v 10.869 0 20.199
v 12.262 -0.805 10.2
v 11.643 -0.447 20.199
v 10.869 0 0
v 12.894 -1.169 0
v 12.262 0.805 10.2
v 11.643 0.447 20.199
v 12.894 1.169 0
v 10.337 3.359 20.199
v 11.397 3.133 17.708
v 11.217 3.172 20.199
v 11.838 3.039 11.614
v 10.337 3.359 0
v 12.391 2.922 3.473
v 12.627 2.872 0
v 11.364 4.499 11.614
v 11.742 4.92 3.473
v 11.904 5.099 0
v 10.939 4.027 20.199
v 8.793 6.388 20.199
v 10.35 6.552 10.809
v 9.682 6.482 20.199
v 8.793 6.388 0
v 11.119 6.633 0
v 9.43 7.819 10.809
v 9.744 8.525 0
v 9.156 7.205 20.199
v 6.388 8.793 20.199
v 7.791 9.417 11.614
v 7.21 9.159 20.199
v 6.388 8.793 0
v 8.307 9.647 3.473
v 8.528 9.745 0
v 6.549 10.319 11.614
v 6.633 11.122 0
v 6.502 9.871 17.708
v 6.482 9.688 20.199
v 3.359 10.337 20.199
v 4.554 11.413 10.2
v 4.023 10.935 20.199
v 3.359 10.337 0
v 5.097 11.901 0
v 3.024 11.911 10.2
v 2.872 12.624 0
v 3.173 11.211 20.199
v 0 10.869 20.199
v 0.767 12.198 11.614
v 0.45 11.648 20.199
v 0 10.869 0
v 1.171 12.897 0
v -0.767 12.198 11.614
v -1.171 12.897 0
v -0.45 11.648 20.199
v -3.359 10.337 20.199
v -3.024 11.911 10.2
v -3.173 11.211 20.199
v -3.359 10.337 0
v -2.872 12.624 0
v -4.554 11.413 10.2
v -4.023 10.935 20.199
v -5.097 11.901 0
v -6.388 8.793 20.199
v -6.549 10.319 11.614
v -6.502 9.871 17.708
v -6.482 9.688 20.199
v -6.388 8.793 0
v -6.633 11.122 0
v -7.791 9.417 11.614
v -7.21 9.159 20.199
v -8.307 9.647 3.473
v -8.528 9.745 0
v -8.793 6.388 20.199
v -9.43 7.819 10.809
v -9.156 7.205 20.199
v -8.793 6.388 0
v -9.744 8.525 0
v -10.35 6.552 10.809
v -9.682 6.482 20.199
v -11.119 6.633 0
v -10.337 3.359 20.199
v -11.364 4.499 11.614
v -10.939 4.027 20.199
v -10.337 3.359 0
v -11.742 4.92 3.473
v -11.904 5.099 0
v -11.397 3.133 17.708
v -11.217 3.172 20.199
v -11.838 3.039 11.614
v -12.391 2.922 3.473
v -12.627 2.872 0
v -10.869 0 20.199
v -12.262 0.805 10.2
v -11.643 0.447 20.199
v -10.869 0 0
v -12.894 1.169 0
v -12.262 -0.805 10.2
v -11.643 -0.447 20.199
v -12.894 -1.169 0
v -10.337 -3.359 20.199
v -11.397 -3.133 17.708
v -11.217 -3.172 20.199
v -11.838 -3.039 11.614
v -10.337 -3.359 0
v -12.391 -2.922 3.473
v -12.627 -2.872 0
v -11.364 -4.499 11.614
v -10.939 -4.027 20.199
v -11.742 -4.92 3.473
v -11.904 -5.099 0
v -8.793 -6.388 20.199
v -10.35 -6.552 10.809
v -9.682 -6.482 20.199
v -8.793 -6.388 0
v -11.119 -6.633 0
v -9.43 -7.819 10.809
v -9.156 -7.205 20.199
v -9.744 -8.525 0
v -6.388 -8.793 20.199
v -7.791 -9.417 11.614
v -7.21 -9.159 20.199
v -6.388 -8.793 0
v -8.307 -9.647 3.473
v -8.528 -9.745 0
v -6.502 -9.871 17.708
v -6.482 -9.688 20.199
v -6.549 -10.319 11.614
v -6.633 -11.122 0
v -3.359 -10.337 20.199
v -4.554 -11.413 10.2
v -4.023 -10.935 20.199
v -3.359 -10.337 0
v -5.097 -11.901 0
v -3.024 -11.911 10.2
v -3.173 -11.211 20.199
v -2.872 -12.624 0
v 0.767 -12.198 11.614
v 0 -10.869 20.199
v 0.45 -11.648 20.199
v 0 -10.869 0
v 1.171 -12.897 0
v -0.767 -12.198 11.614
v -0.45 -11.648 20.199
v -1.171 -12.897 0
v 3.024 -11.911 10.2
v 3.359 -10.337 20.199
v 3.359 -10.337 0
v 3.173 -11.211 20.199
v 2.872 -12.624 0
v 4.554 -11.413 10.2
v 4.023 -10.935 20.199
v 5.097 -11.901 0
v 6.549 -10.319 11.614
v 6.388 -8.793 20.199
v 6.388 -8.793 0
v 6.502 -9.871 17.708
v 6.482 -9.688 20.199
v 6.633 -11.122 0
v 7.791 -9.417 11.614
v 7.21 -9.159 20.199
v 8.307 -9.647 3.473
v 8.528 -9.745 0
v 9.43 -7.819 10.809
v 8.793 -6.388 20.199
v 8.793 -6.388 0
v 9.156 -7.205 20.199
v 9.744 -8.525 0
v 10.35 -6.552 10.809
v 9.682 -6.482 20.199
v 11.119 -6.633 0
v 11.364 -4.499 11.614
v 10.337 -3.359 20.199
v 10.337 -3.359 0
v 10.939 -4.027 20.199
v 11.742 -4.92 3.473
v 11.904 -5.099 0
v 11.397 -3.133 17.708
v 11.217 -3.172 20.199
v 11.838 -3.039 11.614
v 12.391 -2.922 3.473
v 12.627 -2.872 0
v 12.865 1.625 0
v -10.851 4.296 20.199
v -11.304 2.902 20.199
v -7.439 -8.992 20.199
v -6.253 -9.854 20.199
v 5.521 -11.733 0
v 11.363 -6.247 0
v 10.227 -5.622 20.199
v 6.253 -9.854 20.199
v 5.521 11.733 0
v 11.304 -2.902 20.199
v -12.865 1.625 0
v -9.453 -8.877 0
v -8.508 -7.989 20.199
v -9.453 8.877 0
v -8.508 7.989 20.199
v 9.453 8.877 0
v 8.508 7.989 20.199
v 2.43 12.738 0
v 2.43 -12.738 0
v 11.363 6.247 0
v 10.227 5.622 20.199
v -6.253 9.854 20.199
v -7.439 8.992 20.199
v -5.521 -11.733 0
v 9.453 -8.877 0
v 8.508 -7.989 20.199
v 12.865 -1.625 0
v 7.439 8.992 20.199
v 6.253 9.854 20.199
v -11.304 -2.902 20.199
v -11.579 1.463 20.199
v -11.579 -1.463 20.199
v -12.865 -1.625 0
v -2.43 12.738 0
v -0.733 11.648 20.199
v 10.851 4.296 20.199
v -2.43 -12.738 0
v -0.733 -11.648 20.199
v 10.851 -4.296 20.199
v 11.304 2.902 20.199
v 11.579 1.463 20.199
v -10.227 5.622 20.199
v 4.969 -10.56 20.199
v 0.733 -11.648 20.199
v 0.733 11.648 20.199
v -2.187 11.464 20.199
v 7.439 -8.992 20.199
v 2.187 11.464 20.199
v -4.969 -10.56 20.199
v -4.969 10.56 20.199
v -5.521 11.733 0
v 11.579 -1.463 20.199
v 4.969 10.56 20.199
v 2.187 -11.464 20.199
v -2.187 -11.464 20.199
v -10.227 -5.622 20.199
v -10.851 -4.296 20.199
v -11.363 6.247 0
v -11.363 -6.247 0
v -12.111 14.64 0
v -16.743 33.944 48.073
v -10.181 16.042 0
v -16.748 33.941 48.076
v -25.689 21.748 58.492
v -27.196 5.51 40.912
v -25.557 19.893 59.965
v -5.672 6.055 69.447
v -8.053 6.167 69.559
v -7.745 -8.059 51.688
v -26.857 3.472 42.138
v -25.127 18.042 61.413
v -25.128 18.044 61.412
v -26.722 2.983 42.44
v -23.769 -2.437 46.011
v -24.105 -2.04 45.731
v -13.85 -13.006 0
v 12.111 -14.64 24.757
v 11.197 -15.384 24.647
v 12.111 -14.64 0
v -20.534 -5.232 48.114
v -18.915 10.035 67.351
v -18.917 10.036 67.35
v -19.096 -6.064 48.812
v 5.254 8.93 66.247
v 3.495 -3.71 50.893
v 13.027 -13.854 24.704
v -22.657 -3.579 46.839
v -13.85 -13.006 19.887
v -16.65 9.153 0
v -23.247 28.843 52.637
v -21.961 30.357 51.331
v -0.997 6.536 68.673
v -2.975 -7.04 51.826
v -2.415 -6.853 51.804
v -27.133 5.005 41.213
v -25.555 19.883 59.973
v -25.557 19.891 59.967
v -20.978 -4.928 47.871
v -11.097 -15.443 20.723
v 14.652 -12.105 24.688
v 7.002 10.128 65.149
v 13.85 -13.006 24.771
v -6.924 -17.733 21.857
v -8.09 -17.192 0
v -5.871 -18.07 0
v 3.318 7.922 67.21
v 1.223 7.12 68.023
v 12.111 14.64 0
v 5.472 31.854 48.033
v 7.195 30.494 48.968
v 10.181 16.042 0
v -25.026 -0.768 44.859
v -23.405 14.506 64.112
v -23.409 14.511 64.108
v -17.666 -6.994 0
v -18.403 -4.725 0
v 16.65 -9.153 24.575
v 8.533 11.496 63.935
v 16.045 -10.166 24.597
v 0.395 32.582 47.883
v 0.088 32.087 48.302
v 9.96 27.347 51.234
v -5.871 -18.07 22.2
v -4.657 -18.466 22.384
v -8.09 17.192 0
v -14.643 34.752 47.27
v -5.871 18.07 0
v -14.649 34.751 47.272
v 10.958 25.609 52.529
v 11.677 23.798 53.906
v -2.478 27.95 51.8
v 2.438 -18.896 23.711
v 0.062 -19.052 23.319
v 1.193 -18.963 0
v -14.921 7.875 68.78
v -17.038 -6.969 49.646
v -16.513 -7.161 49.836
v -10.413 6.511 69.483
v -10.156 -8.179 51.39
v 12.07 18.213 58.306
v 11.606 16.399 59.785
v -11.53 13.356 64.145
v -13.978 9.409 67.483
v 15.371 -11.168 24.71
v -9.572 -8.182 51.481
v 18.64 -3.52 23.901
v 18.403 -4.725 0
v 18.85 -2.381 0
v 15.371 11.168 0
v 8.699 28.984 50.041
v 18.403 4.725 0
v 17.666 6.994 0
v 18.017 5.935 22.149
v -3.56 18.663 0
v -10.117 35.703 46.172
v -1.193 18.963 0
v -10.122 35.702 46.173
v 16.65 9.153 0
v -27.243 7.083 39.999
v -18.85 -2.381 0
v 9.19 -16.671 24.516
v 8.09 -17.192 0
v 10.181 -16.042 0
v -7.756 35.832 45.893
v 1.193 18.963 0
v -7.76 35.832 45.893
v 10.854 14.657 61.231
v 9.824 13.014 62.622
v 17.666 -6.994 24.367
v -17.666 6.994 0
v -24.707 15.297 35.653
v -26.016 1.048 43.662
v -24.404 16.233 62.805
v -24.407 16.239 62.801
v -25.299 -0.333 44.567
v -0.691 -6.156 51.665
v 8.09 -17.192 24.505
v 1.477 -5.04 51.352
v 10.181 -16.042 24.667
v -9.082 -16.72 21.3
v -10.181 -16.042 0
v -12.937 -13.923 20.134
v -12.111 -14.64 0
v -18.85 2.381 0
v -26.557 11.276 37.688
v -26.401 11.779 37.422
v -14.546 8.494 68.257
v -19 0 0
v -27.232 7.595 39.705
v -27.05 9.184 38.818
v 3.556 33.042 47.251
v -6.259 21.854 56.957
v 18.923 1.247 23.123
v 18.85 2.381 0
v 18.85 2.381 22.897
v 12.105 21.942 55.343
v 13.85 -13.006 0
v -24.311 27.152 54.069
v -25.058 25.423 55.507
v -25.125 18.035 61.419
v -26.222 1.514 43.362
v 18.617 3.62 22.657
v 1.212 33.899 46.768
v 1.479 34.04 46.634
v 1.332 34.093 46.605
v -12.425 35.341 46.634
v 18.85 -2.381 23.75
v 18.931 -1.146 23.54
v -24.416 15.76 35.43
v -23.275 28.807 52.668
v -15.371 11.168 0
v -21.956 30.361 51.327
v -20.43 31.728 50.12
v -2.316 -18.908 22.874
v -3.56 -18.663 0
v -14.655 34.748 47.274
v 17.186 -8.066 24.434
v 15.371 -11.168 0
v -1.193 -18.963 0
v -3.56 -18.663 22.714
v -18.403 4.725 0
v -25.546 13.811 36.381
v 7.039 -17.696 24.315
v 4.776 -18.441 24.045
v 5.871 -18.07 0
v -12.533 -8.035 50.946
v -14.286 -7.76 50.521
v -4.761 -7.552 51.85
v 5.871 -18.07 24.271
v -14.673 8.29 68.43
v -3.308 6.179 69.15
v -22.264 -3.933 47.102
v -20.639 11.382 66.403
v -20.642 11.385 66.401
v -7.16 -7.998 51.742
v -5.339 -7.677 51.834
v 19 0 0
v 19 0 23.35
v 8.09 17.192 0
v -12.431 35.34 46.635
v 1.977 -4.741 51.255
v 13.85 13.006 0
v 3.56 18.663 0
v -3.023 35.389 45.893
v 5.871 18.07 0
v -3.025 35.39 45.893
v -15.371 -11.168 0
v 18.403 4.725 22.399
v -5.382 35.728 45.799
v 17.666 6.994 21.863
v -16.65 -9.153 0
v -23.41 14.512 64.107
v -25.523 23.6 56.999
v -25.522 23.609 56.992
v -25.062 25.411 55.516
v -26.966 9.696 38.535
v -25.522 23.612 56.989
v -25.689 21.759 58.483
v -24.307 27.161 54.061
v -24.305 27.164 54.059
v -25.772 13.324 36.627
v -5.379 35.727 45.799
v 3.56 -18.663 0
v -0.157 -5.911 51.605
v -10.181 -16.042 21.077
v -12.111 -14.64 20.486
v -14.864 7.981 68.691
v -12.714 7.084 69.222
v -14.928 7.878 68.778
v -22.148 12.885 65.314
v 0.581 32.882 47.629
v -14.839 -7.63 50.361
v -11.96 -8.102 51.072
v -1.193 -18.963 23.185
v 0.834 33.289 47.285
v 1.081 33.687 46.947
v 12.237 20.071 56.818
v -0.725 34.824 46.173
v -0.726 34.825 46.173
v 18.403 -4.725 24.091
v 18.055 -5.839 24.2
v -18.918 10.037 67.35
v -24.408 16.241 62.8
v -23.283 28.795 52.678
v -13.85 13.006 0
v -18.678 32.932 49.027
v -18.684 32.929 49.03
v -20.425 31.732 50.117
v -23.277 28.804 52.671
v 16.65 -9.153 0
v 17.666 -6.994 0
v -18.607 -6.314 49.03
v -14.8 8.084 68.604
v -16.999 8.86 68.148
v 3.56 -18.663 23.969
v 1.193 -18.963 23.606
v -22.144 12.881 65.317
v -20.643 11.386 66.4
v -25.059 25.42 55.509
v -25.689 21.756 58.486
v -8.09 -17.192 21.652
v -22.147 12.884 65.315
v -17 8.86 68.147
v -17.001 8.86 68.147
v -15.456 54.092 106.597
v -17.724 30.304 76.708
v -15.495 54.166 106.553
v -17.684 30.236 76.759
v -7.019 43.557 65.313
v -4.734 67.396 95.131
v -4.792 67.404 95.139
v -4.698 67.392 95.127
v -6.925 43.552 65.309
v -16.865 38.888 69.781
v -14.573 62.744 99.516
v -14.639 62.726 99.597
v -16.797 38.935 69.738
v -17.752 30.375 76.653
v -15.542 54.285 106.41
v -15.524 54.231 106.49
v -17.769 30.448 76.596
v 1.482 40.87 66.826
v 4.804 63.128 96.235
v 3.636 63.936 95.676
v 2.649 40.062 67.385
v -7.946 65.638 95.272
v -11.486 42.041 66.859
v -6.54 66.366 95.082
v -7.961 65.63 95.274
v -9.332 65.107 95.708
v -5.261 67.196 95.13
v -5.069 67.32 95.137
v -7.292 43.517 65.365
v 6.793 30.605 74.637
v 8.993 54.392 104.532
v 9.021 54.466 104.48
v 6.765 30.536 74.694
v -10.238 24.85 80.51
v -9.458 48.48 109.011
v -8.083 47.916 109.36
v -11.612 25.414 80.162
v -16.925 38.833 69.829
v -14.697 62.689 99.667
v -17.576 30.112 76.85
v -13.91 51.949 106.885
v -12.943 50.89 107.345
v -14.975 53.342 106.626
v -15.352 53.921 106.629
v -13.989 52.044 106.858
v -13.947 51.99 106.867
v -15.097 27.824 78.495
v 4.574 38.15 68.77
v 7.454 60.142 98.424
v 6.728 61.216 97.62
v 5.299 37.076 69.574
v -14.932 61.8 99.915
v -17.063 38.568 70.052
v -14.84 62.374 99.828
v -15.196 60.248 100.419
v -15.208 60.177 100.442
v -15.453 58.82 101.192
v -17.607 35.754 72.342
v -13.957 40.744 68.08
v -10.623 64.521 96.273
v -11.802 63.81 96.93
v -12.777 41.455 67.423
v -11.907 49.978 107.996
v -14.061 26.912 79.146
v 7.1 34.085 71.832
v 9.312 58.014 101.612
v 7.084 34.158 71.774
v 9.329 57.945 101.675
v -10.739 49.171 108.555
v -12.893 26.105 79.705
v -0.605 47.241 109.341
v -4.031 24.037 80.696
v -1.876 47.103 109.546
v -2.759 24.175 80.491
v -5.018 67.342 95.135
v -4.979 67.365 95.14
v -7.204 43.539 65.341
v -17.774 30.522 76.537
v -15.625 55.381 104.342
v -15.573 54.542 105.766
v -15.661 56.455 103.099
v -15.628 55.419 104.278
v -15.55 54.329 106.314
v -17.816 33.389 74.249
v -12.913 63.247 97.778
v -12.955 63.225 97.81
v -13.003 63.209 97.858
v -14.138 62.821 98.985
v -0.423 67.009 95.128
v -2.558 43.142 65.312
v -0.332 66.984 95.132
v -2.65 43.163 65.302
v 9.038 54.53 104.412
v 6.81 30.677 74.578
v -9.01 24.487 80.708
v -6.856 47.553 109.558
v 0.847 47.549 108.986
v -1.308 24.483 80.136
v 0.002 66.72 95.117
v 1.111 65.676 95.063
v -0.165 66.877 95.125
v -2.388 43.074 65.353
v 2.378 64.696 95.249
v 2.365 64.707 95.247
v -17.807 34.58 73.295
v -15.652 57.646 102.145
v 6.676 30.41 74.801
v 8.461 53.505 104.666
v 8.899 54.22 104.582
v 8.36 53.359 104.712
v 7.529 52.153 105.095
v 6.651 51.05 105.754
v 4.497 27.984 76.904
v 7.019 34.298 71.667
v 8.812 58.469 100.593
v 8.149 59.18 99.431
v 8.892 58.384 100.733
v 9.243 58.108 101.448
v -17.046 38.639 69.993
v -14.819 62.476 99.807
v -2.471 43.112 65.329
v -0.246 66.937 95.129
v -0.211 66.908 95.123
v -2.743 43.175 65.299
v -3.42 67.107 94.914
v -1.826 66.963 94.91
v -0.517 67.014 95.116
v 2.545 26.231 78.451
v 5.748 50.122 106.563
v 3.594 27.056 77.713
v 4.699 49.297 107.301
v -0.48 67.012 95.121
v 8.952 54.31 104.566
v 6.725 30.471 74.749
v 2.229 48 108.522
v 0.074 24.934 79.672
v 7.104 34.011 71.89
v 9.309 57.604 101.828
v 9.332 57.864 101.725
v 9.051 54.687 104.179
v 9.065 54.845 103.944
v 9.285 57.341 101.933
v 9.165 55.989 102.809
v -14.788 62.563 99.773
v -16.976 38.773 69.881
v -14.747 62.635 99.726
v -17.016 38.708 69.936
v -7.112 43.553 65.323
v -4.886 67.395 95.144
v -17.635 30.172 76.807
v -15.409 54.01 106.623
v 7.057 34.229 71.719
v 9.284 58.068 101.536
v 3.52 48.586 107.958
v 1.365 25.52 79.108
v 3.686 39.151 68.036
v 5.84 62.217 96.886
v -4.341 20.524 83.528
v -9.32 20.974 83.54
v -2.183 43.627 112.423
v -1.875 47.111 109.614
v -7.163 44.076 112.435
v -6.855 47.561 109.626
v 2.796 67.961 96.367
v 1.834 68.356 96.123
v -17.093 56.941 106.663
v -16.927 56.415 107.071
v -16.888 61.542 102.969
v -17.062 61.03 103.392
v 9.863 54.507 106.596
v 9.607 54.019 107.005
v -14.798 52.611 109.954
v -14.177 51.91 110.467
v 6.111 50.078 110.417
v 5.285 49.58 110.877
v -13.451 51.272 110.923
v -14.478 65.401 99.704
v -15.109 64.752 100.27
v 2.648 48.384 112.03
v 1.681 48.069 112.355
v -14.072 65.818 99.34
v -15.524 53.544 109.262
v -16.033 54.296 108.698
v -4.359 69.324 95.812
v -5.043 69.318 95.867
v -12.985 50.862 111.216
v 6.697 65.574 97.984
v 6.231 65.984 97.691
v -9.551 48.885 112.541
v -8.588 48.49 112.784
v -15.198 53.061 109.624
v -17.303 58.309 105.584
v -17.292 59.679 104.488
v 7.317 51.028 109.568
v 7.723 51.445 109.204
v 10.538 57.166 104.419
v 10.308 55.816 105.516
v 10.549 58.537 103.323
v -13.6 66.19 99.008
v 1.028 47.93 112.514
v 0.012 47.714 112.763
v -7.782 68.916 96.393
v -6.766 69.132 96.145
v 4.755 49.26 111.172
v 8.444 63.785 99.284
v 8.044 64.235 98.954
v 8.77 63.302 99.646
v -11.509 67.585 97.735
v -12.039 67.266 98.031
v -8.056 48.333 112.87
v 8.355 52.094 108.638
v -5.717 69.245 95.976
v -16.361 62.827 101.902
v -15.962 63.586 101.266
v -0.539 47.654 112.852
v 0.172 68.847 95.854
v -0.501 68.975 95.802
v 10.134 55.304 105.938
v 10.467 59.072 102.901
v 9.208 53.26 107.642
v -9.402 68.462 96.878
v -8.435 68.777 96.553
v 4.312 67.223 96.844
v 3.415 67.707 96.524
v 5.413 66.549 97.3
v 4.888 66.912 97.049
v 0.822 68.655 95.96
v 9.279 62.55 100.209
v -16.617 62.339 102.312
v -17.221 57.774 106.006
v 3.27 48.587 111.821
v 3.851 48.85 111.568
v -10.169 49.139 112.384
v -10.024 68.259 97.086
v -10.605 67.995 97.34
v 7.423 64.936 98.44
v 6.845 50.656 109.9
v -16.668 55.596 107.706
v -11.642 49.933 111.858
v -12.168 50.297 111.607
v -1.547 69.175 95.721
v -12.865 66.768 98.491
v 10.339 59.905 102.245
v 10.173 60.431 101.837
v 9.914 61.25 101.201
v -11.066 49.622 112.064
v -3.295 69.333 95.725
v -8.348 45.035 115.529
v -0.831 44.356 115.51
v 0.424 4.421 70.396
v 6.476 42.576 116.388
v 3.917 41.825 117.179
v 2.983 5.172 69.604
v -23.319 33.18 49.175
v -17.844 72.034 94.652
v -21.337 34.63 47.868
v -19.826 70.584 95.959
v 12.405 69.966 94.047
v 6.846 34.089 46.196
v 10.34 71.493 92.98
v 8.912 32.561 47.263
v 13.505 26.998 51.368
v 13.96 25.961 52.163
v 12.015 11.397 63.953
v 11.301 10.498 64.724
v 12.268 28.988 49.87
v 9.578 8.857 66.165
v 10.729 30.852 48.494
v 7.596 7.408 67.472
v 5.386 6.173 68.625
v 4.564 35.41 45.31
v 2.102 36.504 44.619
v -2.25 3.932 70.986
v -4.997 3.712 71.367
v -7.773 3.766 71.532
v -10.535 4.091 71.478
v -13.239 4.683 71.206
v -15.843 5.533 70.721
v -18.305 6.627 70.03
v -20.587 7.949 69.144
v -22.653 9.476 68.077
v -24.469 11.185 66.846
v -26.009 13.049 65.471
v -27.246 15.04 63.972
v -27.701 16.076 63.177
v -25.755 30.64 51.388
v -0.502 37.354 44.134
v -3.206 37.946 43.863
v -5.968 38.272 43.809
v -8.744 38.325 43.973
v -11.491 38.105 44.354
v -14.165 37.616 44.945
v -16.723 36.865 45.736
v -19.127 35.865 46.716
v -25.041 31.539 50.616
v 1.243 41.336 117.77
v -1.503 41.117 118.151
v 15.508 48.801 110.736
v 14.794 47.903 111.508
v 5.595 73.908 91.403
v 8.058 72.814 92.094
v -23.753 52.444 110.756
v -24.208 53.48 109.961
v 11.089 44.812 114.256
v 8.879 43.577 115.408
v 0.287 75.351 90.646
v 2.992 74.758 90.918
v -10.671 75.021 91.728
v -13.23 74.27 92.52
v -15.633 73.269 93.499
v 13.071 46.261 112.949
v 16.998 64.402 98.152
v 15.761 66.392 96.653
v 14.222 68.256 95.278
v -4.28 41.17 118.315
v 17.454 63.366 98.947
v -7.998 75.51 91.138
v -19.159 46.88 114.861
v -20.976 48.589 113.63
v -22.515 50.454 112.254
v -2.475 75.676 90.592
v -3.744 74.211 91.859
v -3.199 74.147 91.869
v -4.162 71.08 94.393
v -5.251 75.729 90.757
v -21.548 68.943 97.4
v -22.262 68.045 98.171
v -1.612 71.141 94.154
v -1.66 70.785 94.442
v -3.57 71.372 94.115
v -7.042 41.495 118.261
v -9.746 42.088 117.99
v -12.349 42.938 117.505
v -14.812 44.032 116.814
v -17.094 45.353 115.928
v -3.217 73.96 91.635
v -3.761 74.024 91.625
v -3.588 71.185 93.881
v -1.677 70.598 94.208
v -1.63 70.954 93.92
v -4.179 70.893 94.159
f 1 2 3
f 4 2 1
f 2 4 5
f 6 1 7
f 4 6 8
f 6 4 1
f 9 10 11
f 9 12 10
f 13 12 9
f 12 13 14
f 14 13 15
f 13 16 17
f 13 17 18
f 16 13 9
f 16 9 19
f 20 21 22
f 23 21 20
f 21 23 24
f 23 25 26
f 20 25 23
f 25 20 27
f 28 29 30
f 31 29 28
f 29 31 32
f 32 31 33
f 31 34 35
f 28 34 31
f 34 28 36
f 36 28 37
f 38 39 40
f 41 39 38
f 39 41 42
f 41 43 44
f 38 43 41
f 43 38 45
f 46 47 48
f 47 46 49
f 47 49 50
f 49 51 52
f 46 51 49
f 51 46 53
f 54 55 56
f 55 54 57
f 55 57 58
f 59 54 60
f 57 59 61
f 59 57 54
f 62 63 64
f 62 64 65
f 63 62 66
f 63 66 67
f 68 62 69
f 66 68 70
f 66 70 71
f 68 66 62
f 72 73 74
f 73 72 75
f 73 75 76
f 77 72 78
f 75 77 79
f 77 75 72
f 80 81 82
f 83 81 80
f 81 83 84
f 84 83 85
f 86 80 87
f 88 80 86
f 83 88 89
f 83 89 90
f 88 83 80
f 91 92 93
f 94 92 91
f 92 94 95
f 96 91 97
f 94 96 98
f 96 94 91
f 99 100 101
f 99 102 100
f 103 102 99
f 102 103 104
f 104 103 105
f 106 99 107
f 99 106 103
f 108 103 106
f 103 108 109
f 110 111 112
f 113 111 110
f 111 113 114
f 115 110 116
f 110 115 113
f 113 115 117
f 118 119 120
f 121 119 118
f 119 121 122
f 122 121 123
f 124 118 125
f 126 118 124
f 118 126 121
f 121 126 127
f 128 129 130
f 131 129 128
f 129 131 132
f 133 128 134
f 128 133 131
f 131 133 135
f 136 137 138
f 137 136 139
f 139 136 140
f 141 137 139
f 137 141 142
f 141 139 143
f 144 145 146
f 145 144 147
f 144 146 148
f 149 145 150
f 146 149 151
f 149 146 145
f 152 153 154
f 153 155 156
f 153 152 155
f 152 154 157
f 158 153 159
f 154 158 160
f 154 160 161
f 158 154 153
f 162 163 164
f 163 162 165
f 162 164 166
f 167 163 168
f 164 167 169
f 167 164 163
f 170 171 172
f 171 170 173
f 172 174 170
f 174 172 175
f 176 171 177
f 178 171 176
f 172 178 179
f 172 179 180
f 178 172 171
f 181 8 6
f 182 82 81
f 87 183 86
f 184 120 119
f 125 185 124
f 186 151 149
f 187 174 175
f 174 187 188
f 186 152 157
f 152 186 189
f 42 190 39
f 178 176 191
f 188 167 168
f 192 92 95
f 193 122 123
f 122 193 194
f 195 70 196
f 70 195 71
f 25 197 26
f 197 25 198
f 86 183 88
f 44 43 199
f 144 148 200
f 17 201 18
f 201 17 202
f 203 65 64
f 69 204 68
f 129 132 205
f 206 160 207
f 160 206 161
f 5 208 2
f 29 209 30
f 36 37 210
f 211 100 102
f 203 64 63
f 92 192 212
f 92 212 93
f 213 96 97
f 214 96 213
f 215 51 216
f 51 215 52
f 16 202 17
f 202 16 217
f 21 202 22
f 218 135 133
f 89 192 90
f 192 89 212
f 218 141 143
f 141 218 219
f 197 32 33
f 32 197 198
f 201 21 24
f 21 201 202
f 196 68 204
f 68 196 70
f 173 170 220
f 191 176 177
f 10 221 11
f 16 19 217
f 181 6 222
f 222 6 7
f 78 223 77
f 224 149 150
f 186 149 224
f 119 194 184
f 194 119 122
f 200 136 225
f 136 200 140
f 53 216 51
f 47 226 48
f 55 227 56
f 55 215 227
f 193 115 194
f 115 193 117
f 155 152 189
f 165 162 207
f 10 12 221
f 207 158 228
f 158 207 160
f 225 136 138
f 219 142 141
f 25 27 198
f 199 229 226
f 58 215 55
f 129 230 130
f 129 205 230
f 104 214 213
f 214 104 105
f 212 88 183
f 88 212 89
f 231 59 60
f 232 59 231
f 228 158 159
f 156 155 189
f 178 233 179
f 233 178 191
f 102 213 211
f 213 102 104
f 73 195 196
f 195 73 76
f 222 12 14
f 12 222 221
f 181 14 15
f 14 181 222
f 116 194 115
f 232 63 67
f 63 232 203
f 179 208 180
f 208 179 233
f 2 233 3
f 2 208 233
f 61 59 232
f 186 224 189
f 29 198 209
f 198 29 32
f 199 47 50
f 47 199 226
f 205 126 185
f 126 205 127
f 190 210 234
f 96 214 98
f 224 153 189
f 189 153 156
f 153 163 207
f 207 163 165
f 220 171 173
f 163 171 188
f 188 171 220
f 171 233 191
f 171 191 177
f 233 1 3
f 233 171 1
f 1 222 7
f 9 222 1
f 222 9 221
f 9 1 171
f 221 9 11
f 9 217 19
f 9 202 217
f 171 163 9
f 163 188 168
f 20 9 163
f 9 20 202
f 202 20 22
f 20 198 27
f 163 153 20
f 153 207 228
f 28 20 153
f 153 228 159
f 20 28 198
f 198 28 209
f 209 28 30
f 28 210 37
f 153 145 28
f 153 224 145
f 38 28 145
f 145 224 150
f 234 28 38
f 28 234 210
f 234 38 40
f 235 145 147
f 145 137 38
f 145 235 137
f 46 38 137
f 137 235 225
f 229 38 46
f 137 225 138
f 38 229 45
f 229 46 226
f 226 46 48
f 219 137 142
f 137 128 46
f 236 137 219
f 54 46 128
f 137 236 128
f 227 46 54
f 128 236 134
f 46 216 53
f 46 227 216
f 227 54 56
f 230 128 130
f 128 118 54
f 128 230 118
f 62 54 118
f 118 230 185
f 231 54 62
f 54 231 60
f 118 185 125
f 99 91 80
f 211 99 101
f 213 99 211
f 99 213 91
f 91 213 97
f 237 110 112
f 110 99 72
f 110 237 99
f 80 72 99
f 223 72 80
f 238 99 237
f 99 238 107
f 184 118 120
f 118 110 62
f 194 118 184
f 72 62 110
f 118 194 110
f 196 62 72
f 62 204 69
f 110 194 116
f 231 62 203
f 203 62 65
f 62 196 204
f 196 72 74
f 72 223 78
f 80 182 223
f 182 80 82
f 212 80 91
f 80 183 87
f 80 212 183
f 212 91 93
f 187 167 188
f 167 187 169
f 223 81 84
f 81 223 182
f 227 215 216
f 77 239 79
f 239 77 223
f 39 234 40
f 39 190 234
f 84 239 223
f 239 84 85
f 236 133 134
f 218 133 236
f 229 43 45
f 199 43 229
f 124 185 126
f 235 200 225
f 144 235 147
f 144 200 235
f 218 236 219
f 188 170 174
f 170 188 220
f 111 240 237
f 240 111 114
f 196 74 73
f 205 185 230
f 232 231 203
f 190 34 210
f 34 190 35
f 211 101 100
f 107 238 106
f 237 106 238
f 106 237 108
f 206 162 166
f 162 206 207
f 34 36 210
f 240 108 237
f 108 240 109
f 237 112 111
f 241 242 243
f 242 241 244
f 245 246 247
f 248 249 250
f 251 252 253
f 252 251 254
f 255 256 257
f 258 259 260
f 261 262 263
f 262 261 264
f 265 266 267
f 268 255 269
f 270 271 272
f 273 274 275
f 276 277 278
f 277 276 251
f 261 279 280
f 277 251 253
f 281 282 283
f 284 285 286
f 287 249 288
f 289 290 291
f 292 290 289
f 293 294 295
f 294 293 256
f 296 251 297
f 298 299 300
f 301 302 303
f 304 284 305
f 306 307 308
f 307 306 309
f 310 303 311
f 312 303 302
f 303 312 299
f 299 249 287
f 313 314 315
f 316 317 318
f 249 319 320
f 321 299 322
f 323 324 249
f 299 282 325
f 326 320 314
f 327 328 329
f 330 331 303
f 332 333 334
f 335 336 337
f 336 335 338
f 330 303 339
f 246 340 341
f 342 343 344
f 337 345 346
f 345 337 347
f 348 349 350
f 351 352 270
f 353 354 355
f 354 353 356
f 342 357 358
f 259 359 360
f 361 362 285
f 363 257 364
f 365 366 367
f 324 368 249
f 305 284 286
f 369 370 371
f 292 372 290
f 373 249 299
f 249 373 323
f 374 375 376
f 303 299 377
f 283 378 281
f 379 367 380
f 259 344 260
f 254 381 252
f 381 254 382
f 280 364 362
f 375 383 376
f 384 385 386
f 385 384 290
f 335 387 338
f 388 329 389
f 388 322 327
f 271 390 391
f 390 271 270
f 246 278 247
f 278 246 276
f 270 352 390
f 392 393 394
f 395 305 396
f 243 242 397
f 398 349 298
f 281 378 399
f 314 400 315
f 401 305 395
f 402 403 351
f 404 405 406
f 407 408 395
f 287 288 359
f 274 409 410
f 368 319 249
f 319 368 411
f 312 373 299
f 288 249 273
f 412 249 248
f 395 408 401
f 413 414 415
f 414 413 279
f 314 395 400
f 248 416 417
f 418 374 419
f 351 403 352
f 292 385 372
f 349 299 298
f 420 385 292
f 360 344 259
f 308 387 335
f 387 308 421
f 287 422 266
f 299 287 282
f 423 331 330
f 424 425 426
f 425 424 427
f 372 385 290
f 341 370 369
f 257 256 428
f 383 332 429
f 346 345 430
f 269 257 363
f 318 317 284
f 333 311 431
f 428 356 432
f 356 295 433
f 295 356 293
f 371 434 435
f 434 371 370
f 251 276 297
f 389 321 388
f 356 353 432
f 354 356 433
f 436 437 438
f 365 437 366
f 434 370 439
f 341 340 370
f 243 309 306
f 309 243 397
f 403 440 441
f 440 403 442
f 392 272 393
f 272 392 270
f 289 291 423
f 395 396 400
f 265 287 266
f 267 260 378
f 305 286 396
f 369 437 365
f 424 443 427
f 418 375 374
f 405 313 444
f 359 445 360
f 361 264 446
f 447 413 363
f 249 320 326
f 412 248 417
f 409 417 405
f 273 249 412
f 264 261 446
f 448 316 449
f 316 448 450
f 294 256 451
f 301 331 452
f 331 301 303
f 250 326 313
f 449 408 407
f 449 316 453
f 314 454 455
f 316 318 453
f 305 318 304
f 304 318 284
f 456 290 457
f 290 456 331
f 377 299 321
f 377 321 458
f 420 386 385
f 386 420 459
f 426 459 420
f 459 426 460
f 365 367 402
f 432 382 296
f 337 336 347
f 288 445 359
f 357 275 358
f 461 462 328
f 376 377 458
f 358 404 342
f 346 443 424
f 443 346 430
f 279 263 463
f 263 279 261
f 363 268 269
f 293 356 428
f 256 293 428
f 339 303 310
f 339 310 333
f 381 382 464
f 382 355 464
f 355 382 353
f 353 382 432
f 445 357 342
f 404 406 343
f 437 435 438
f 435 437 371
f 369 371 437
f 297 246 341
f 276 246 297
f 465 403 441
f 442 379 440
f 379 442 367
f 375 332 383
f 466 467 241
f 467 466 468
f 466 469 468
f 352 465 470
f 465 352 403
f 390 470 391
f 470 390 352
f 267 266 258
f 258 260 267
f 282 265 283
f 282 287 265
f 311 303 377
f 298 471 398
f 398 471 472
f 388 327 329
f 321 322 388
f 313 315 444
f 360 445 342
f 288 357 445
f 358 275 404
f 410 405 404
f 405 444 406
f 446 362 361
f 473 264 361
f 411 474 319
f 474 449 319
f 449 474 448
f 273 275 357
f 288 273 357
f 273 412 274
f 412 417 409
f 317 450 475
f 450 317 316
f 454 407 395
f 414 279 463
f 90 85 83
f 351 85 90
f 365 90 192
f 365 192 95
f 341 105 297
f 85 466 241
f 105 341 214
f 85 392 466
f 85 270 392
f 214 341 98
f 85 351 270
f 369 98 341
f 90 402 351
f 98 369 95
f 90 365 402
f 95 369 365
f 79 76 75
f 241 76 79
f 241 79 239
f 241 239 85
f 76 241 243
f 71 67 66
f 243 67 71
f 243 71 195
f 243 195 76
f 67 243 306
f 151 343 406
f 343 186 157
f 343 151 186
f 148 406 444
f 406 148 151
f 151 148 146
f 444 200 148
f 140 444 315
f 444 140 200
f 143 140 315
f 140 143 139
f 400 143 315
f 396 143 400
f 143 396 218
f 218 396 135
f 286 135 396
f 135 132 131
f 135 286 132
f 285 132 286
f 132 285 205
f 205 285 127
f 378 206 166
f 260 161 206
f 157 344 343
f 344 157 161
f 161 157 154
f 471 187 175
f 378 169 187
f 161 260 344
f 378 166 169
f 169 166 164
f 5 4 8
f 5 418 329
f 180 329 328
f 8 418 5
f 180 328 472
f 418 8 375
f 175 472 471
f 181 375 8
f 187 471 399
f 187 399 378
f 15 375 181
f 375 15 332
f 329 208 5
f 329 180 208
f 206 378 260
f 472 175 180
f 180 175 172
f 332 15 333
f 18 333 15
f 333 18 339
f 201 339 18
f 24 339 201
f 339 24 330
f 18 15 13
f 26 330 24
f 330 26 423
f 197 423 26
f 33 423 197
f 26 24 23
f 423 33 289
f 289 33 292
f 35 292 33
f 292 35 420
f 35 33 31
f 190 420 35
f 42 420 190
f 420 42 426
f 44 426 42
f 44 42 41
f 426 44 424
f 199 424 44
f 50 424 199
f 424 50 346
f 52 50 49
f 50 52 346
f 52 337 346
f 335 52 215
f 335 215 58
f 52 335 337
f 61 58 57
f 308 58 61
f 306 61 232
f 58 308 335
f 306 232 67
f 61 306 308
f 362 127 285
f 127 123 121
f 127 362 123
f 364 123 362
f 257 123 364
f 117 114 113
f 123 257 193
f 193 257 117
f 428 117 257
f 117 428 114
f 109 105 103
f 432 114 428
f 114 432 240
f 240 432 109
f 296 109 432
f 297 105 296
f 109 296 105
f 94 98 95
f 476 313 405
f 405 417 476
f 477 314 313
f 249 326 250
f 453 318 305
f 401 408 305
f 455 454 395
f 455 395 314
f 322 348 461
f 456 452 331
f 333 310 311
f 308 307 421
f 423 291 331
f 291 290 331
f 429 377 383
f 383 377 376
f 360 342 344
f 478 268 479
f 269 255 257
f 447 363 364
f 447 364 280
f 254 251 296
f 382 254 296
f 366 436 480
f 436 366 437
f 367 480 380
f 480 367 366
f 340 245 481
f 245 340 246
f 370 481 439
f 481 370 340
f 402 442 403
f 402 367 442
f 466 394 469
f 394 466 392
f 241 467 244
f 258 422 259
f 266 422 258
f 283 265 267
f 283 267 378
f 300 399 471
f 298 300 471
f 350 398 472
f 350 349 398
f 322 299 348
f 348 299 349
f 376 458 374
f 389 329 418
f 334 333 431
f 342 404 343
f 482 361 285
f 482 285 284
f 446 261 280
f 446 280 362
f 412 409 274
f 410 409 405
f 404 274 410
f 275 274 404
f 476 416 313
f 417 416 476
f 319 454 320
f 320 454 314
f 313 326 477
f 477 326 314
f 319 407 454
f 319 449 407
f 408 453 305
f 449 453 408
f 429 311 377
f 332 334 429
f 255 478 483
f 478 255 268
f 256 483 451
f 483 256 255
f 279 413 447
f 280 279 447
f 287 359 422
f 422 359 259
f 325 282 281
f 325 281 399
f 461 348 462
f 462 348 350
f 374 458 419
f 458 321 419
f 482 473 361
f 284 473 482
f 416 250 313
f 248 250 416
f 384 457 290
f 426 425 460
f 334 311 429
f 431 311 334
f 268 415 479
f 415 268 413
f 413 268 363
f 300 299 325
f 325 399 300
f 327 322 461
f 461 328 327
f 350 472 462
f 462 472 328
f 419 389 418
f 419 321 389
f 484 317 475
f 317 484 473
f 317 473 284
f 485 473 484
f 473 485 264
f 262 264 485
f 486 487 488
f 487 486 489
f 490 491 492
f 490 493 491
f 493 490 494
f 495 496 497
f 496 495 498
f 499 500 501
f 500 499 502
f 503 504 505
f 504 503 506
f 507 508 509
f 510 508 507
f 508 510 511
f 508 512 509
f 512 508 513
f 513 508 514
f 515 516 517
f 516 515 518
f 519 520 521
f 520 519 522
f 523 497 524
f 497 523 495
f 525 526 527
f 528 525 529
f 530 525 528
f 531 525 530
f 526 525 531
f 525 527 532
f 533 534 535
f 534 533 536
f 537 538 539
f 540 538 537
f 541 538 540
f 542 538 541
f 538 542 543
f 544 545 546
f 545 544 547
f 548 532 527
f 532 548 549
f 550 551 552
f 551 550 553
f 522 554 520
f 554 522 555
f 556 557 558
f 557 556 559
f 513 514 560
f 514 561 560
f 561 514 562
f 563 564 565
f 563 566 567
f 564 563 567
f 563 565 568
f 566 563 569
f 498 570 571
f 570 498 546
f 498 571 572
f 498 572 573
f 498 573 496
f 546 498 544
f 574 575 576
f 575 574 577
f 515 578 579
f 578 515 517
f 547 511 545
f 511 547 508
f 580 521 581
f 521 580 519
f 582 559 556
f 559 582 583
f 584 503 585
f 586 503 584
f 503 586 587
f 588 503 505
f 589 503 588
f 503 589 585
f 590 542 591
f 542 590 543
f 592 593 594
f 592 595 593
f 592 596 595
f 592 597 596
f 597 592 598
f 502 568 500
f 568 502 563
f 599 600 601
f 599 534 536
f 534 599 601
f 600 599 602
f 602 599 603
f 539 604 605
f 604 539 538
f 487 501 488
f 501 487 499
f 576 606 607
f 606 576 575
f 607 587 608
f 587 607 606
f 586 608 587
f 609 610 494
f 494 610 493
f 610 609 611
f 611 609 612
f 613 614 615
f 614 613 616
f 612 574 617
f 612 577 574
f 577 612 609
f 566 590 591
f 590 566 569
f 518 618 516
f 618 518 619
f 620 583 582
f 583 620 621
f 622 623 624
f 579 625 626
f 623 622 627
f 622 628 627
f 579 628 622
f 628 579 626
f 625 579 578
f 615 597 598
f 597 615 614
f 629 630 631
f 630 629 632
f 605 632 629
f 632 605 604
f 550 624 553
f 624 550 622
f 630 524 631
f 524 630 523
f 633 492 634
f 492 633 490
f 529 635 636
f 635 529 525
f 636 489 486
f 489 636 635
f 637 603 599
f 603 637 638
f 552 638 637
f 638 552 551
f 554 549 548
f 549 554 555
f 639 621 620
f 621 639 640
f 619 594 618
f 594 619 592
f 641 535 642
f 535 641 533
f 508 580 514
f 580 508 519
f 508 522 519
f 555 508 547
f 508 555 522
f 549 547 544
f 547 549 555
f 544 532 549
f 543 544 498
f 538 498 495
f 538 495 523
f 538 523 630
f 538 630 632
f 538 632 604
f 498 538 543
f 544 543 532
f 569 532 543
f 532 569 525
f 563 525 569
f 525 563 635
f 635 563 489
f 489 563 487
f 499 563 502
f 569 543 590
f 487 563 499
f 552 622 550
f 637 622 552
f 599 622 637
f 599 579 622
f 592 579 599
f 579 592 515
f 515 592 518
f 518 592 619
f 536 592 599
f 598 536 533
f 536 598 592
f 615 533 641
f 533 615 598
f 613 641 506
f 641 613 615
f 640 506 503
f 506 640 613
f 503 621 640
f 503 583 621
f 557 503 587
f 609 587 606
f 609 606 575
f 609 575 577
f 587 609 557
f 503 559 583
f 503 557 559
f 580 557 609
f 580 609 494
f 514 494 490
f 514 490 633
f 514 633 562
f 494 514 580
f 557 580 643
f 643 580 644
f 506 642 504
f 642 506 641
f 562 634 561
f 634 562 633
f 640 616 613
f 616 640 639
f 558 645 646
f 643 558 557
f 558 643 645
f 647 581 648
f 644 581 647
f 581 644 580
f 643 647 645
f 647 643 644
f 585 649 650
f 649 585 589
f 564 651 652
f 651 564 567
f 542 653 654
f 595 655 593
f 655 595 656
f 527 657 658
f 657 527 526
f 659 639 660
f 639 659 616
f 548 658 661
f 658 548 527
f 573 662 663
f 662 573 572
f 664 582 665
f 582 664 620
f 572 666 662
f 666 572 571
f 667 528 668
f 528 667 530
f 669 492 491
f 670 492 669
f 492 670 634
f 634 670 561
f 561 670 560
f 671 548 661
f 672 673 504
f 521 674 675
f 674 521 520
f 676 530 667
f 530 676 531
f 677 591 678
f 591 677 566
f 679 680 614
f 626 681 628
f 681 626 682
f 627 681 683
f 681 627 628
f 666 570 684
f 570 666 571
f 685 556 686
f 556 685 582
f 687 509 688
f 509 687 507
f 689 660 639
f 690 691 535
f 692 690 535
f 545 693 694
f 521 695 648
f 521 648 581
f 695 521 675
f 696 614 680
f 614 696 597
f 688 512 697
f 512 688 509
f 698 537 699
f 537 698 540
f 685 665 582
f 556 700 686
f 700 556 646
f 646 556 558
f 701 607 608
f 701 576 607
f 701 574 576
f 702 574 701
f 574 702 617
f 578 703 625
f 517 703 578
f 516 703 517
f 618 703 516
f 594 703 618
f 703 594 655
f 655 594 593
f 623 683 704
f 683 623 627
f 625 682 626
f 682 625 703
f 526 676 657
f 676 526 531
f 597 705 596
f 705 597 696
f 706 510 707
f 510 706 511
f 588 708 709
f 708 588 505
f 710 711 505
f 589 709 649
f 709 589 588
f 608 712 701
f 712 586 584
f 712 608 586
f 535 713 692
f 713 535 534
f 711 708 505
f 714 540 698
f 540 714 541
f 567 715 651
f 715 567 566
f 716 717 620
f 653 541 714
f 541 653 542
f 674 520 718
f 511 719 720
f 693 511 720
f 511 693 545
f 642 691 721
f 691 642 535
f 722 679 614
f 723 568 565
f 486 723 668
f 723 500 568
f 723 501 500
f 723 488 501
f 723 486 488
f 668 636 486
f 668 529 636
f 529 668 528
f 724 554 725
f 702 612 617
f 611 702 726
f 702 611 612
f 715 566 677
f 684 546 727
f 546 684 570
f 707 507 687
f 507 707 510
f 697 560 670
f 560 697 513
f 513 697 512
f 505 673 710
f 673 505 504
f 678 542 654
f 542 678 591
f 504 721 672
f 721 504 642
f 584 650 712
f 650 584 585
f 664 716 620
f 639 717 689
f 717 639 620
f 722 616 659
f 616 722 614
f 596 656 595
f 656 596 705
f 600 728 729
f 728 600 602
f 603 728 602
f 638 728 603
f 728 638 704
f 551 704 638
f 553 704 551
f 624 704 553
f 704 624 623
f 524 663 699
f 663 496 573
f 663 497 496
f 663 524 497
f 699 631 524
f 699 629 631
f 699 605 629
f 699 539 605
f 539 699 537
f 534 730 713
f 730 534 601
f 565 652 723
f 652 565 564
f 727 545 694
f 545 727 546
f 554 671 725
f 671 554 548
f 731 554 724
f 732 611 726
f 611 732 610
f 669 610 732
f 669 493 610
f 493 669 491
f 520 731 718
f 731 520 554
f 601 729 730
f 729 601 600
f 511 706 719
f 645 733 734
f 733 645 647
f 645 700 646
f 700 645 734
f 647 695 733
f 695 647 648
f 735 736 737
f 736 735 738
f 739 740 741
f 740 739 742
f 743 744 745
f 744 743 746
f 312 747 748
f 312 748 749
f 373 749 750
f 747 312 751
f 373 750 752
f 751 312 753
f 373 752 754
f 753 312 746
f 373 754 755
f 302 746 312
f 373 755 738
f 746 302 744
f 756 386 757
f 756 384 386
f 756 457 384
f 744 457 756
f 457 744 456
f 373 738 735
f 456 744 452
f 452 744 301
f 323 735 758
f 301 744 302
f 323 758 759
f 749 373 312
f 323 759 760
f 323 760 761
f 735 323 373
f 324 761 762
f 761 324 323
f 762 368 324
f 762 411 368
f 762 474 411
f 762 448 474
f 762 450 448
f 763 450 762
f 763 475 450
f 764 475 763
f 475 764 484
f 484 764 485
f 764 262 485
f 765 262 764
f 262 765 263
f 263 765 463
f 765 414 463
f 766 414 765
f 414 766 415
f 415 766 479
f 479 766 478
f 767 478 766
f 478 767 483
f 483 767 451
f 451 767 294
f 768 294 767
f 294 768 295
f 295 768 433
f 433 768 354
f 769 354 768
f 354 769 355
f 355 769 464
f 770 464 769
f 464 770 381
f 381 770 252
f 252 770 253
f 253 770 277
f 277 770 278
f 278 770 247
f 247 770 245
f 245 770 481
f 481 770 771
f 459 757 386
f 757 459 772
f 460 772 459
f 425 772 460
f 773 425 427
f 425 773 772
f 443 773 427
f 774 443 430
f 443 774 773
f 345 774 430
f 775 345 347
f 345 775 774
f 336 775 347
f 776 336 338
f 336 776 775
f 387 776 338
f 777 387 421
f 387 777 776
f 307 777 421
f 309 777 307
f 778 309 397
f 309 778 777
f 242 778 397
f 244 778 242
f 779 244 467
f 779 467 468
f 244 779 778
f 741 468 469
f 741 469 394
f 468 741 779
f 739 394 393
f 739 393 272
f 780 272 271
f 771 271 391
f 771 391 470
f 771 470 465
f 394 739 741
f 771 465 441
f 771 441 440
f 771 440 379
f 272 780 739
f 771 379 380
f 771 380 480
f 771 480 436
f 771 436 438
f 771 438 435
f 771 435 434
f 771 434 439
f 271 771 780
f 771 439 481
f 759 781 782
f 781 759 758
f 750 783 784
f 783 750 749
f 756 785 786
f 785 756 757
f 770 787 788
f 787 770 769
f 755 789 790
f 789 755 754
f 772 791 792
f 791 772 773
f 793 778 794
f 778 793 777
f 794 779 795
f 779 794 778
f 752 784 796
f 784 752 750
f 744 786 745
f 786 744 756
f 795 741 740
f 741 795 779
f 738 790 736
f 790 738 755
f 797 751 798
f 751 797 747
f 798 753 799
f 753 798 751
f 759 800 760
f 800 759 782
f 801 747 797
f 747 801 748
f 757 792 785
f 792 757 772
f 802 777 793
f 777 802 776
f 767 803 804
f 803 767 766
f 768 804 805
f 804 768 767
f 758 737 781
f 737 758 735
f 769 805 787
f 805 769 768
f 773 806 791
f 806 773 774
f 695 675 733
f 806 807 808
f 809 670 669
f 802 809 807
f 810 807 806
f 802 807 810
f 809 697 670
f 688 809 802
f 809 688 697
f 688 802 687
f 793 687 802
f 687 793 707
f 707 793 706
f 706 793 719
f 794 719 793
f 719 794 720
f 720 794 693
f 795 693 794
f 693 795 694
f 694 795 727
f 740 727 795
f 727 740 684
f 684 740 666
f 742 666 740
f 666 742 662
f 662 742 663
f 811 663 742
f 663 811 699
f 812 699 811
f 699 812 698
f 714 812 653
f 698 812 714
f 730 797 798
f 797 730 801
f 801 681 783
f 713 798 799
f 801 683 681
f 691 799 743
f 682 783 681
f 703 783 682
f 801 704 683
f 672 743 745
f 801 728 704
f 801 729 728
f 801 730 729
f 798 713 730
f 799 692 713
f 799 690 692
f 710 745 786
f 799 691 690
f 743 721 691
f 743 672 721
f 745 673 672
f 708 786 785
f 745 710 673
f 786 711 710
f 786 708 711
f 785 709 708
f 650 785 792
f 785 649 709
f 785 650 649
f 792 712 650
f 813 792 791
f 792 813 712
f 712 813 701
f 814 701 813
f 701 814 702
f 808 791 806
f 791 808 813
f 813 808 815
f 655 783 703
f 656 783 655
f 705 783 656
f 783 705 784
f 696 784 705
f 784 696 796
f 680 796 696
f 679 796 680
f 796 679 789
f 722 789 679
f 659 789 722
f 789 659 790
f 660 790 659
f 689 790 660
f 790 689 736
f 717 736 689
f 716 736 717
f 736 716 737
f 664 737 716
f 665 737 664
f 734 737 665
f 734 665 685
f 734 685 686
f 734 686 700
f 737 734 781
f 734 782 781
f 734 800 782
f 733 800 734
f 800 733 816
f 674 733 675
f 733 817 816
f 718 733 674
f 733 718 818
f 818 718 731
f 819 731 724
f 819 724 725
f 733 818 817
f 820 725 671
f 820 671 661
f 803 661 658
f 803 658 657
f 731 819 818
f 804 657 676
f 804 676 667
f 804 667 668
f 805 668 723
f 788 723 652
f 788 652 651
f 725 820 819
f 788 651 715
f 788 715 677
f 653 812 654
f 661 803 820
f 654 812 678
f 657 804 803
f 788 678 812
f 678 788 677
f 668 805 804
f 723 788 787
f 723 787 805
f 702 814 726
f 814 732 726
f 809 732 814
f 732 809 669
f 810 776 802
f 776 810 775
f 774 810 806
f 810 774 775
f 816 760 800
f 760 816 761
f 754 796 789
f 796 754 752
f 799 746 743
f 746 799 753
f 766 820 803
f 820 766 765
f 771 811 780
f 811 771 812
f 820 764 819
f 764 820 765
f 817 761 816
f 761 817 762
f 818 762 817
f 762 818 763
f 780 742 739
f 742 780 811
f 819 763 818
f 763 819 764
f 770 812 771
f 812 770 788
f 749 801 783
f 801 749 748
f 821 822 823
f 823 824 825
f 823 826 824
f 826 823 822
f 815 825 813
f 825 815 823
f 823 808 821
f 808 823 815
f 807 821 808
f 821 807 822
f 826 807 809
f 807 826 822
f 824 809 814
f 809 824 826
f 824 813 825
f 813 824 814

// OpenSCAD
// file: connector_spline.scad
pConnectorSplineOverlap=0.001;

//connectorSpline(20,30,20,3,0.95);
//%connectorSplineCutout(20,30,20,3,0.95);

module connectorSpline(pConnectorSplineRidgeCount, pConnectorSplineLength, pConnectorSplineDia,
        pConnectorSplineRidgeDepth,pConnectorSplineTaperFactor) {
    difference() {
        cylinder(d1=pConnectorSplineDia, d2=pConnectorSplineDia*pConnectorSplineTaperFactor,
                h=pConnectorSplineLength, $fn=50);
        for (c=[0:pConnectorSplineRidgeCount]) {
            rotate([0,0,c*360/pConnectorSplineRidgeCount])
                translate([pConnectorSplineDia/2+pConnectorSplineOverlap,0,-pConnectorSplineOverlap])
                    rotate([0,0,180])
                        cylinder(d=pConnectorSplineRidgeDepth,
                            h=pConnectorSplineLength+pConnectorSplineOverlap*2, $fn=3);
        }
    }
}

module connectorSplineCutout(pConnectorSplineRidgeCount, pConnectorSplineLength, pConnectorSplineDia,
        pConnectorSplineRidgeDepth,pConnectorSplineTaperFactor) {
    scale([1.05,1.05,1.01]) 
        connectorSpline(pConnectorSplineRidgeCount, pConnectorSplineLength, 
            pConnectorSplineDia, pConnectorSplineRidgeDepth,pConnectorSplineTaperFactor);
}
// file: under_seat_pvc_cross_bar_rod_holder_common.scad
connectorSplineRidgeCount=20;
connectorSplineLength=20;
// 38 is the connectorPostDia value
connectorSplineDia=38*0.65;
connectorSplineRidgeDepth=4;
connectorSplineTaperFactor=0.9;
// file: pvc_connectors.scad
pvc100PipeInnerDia=26.25;  // 1 inch
pvc100PipeOuterDia=33.5; // 1.32 inches
pvc100FittingInnerDia=pvc100PipeOuterDia;
pvc100FittingOuterDia=42.8; // 1.7 inches

pvc125PipeInnerDia=31.75;  // 1.25 inches
pvc125PipeOuterDia=42.25; // 1.665 inches
pvc125FittingInnerDia=pvc125PipeOuterDia;
pvc125FittingOuterDia=50.45;  // 1.985 inches
pvc125FittingInsertionDepth=32; // ~1.25 inches

pvcFittingTolerance=0.75;

//pvcElbow45(pvc125FittingInnerDia, pvc125FittingOuterDia, pvc125FittingInsertionDepth);

module pvcElbow45(pvcElbow45InnerDia, pvcElbow45OuterDia, pvcElbow45InsertionDepth) {
    pvcElbow45OuterBendExtraLength=pvcElbow45OuterDia;
    union() {
        pvcElbow45Half(pvcElbow45InnerDia, pvcElbow45OuterDia, 
            pvcElbow45InsertionDepth, pvcElbow45OuterBendExtraLength);
        mirror([0,0,1])
            pvcElbow45Half(pvcElbow45InnerDia, pvcElbow45OuterDia, 
                pvcElbow45InsertionDepth, pvcElbow45OuterBendExtraLength);
    }
}

module pvcElbow45Half(pvcElbow45InnerDia, pvcElbow45OuterDia, pvcElbow45InsertionDepth, pvcElbow45OuterBendExtraLength) {
    translate([0,0,-pvcElbow45InsertionDepth-pvcElbow45OuterBendExtraLength/4])
    difference() {
        %cylinder(d=pvcElbow45OuterDia, h=pvcElbow45InsertionDepth+pvcElbow45OuterBendExtraLength);
        %translate([-pvcElbow45OuterDia,pvcElbow45OuterDia/2,pvcElbow45InsertionDepth])
            rotate([45+45/2,0,0])
                cube([pvcElbow45OuterDia*2,pvcElbow45OuterDia*2,pvcElbow45OuterDia*2]);
    }
}
// file: insertion_receiver.scad
hobieChairLegInsertDia=24.3;
hobieChairLegInsertDepth=40;
hobieChairLegInsertOffset=0;

// height of "blade" that fits into the alignment key slot on one side
hobieChairLegKeyRidgeHeight=3.25;
hobieChairLegKeyRidgeHeightCurvatureOverlap=0.5;
hobieChairLegKeyRidgeWidth=4;
hobieChairLegKeyRidgeTolerance=0.5;

receiverStampDepth=0.3;
receiverFontHeight=4;
receiverStampXPos=-3;
receiverStampYPos=16;

module insertionReceiver(insertionReceiverVerticalAngle,
        insertionReceiverVerticalAngleOffsetAdjust, 
        insertionReceiverKeyBottomRotationAdjust,
        insertionReceiverCasingThickness, receiverStampText) {
    insertionReceiverOuterDia=hobieChairLegInsertDia+insertionReceiverCasingThickness*2;
    insertionReceiverOverallLength=hobieChairLegInsertDepth+bracketCasingThickness;
    difference() {
        cylinder(d=insertionReceiverOuterDia,
            h=insertionReceiverOverallLength);
    translate([0,0,bracketCasingThickness+overlap])
        translate([insertionReceiverVerticalAngleOffsetAdjust,0,0])  // offset to recenter
            rotate([0,insertionReceiverVerticalAngle,insertionReceiverKeyBottomRotationAdjust])
                // apply the vertical angle internally
                insertionReceiverCutout();
        // flatten the sides of the cylinder
        translate([-insertionReceiverOuterDia/2-bracketWidth/2,
                -insertionReceiverOuterDia/2-overlap,-overlap])
            cube([insertionReceiverOuterDia/2+overlap,
                insertionReceiverOuterDia+overlap*2,
                insertionReceiverOverallLength+overlap*2]);
        translate([bracketWidth/2-overlap,
                -insertionReceiverOuterDia/2-overlap,-overlap])
            cube([insertionReceiverOuterDia/2+overlap,
                insertionReceiverOuterDia+overlap*2,
                insertionReceiverOverallLength+overlap*2]);
        // Stamp
        translate([receiverStampXPos,receiverStampYPos,
            insertionReceiverOverallLength-receiverStampDepth]) {
            linear_extrude(height=receiverStampDepth*4) {
                text(receiverStampText,font="lintsec",size=receiverFontHeight);
            }
        }
    }
}

module insertionReceiverCutout() {
    flatSideCornerHeight=1.5;
    bevelHeight=3;
    bevelFactor=1.5;
    actualKeyWidth=hobieChairLegKeyRidgeWidth+hobieChairLegKeyRidgeTolerance*2;
    actualKeyHeight=hobieChairLegKeyRidgeHeight+hobieChairLegKeyRidgeTolerance*2;
    
    // Note: Allowing the cutout to be rotated depends on the top of this to
    // be extended a bit.  The "bevel" shapes at the mouth provide the extra length.
    union() {
        hull() {
            cylinder(d=hobieChairLegInsertDia,h=hobieChairLegInsertDepth+overlap);
            // corners of wide flat side of cutout
            rotate([0,0,25])
                translate([-hobieChairLegInsertDia/2,0,0])
                    cylinder(d=flatSideCornerHeight, h=hobieChairLegInsertDepth+overlap);
            rotate([0,0,-25])
                translate([-hobieChairLegInsertDia/2,0,0])
                    cylinder(d=flatSideCornerHeight, h=hobieChairLegInsertDepth+overlap);
            // corners of narrow slot opposite wide flat side
            rotate([0,0,10])
                translate([hobieChairLegInsertDia/2,0,0])
                    cylinder(d=flatSideCornerHeight, h=hobieChairLegInsertDepth+overlap);
            rotate([0,0,-10])
                translate([hobieChairLegInsertDia/2,0,0])
                    cylinder(d=flatSideCornerHeight, h=hobieChairLegInsertDepth+overlap);
            // corners of narrow slot opposite key slot
            rotate([0,0,10])
                translate([0,hobieChairLegInsertDia/2,0])
                    cylinder(d=flatSideCornerHeight, h=hobieChairLegInsertDepth+overlap);
            rotate([0,0,-10])
                translate([0,hobieChairLegInsertDia/2,0])
                    cylinder(d=flatSideCornerHeight, h=hobieChairLegInsertDepth+overlap);
        }
        // key slot
        translate([-actualKeyWidth/2,
                -hobieChairLegInsertDia/2-actualKeyHeight, 0])
            cube([actualKeyWidth,
                actualKeyHeight+hobieChairLegKeyRidgeHeightCurvatureOverlap,
                hobieChairLegInsertDepth+overlap]);
        // bevel out at mouth
        translate([0,0,hobieChairLegInsertDepth-bevelHeight])
            cylinder(d1=hobieChairLegInsertDia,d2=hobieChairLegInsertDia*bevelFactor,h=10);
        keyHeightWidthDifference=abs(actualKeyHeight-actualKeyWidth);
        translate([0,-hobieChairLegInsertDia/2-actualKeyHeight/2+keyHeightWidthDifference/2,
                hobieChairLegInsertDepth-bevelHeight])
            rotate([0,0,45])
            // note: setting $fn for 4 sides cuts the dia down, so it has to be re-enlarged
            // note: angles on this tiny part need to be bigger, so bevelFactor is increased a bit
            cylinder(d1=actualKeyWidth*1.4, d2=actualKeyWidth*1.4*bevelFactor*1.25, 
                    h=actualKeyWidth, $fn=4);
        
    }
}
// main file
include <insertion_receiver.scad>
include <pvc_connectors.scad>
include <under_seat_pvc_cross_bar_rod_holder_common.scad>
include <connector_spline.scad>

bracketWidth=40;
bracketCasingThickness=20;

setScrewHoleDia=3;

bodyExtensionRoundoffDia=9;
bodyEdgeRoundOffDia=3;

// Note: Difference between the insert angle and the front receiver
// angle is about 8 degrees down
// i.e. If the receiver is horizontal, the insert angles down a bit
rearPvcInsertLength=40;
rearPvcInsertOffset=10;
rearPvcInsertAngle=0;  // was -8 before adding "z post" - TODO: Remove this
rearPvcInsertPostExtensionXOffset=-0;  // was -10
rearPvcInsertPostExtensionYOffset=0;   // was 10

leftSide=true;

// This angle allows the body to be oriented such that it more or less aligns with
// an imaginary line from front to back between the seat posts.  The "short-side"
// seat post insert on the front seat post is not directly aligned, and is
// a little different on the left and right side of the seat.
frontInsertionReceiverVerticalAngle=(leftSide) ? -2 : -2;
// This re-centers the cutout.
frontInsertionReceiverVerticalAngleOffsetAdjust=(leftSide) ? 2.5 : 1;

frontInsertionReceiverKeyAngleOffsetAdjust=(leftSide) ? 1.5 : 1;

// These align the key and the angle of the cutout hole on the receiver
// for the rear chair-leg insert post
rearInsertionReceiverVerticalAngle=(leftSide) ? 0 : 0;
// This re-centers the cutout.
rearInsertionReceiverVerticalAngleOffsetAdjust=(leftSide) ? 0 : 0;

rearInsertionReceiverKeyAngleOffsetAdjust=(leftSide) ? 2 : 0;

rearInsertionReceiverCasingThickness=10;

connectorPostDia=38;

connectorPostLength=(leftSide) ? 25 : 25;

connectorPostTopRotationX=(leftSide) ? -20 : -20;
connectorPostTopRotationY=(leftSide) ? 20 : 20;
connectorPostTopLength=(leftSide) ? 20 : 20;

connectorPostBottomRotationX=(leftSide) ? -20 : -15;
connectorPostBottomRotationY=(leftSide) ? -20 : -15;
connectorPostBottomLength=(leftSide) ? 20 : 20;

overlap=0.001;
$fn=50;

// TODO: Find a simple way to create a spline (linear extrude a cartoon sun shape or use a low $fn cylinder)
// TODO: Cut out a (negative) spline into which the other part will glue

union() {
    // TODO: re-position & re-orient to mate up with the
    // solid end of the receiver (on x/y plane).
    // TODO: OR... still do the connectorPostTransform to set the position, 
    // and then flip/reorient the whole thing.  
    // TODO: OR... build the connector post upside down (from the top at x/y plane center) instead
  //      translate([0,0,60])
  //          rotate([180,0,0]) 
                difference() {
                connectorPost(connectorPostLength,connectorPostDia,
                        connectorPostTopRotationX,connectorPostTopRotationY,
                        connectorPostTopLength,connectorPostBottomRotationX,connectorPostBottomRotationY,
                        connectorPostBottomLength);
                    translate([0,0,-overlap])
                    connectorSplineCutout(connectorSplineRidgeCount,connectorSplineLength,
                        connectorSplineDia,connectorSplineRidgeDepth,connectorSplineTaperFactor);
                }
                connectorPostTransform(connectorPostLength,connectorPostDia,
                        connectorPostTopRotationX,connectorPostTopRotationY,connectorPostTopLength,
                        connectorPostBottomRotationX,connectorPostBottomRotationY,
                        connectorPostBottomLength) {
//    rotate([180,0,0])
                    insertionReceiver(rearInsertionReceiverVerticalAngle,
                        rearInsertionReceiverVerticalAngleOffsetAdjust,
                        rearInsertionReceiverKeyAngleOffsetAdjust,
                        rearInsertionReceiverCasingThickness, (leftSide) ? "L" : "R");
                        }
}

/*
 * apply this to a part that is centered on the x/y plane before
 * moving it to the spot where the connector post starts to put
 * it at the other end of the connector post.
 */
module connectorPostTransform(postLength, postDia, 
        topRotationX,topRotationY, topLength, 
        bottomRotationX, bottomRotationY,bottomLength) {
    // 3 stages of move then rotate into displaced position
    translate([0,0,bottomLength]) rotate([bottomRotationX,bottomRotationX,0]) 
        translate([0,0,postLength])
            rotate([topRotationX,topRotationY,0]) translate([0,0,topLength])
                children();
}
/*
 * Creates a post with an angled section at the top and bottom to create a flat interface
 * on each end.  Used to connect two other parts at odd angles
 * 
 * Bottom flat-interface will be aligned with the x/y plane.
 */
module connectorPost(postLength, postDia, 
        topRotationX,topRotationY, topLength, 
        bottomRotationX,bottomRotationY,bottomLength) {
    hull() {
  //      union() {  // uncomment for diagnostics... instead of hull
            // base (middle) part -- cut a cylinder off on the top at the rotation angles
            translate([0,0,bottomLength]) rotate([bottomRotationX,bottomRotationY,0]) {
            difference() {
                translate([0,0,-postDia])
                    cylinder(d=postDia, h=postLength+postDia*2);
                // cut off top
                translate([0,0,postLength])
                    rotate([topRotationX/2,topRotationY/2,0])
                        cylinder(d=postDia*2, h=postDia*2);
                // cut off bottom
                rotate([-bottomRotationX/2,-bottomRotationY/2,0])
                    translate([0,0,-postDia*2])
                    cylinder(d=postDia*2, h=postDia*2);
            }
            // top-part -- cut a cylinder off on the bottom at the topRotation angles
            translate([0,0,postLength])
                rotate([topRotationX/2,topRotationY/2,0])
                    difference() {
                        // Note: This one rotates after moving it to cut at the bottom.
                        rotate([topRotationX/2,topRotationY/2,0])
                            translate([0,0,-topLength*0.5])
                                cylinder(d=postDia, h=topLength*1.5);
                        translate([0,0,-topLength])
                            cylinder(d=postDia*2, h=topLength);
                    }
            }
            // bottom-part -- cut a cylinder off on the top at the bottomRotation angles
            difference() {
                        cylinder(d=postDia, h=bottomLength*1.5);
                        translate([0,0,bottomLength])
                            rotate([bottomRotationX/2,bottomRotationY/2,0])
                                cylinder(d=postDia*2, h=bottomLength);
                }
        
    }
}
